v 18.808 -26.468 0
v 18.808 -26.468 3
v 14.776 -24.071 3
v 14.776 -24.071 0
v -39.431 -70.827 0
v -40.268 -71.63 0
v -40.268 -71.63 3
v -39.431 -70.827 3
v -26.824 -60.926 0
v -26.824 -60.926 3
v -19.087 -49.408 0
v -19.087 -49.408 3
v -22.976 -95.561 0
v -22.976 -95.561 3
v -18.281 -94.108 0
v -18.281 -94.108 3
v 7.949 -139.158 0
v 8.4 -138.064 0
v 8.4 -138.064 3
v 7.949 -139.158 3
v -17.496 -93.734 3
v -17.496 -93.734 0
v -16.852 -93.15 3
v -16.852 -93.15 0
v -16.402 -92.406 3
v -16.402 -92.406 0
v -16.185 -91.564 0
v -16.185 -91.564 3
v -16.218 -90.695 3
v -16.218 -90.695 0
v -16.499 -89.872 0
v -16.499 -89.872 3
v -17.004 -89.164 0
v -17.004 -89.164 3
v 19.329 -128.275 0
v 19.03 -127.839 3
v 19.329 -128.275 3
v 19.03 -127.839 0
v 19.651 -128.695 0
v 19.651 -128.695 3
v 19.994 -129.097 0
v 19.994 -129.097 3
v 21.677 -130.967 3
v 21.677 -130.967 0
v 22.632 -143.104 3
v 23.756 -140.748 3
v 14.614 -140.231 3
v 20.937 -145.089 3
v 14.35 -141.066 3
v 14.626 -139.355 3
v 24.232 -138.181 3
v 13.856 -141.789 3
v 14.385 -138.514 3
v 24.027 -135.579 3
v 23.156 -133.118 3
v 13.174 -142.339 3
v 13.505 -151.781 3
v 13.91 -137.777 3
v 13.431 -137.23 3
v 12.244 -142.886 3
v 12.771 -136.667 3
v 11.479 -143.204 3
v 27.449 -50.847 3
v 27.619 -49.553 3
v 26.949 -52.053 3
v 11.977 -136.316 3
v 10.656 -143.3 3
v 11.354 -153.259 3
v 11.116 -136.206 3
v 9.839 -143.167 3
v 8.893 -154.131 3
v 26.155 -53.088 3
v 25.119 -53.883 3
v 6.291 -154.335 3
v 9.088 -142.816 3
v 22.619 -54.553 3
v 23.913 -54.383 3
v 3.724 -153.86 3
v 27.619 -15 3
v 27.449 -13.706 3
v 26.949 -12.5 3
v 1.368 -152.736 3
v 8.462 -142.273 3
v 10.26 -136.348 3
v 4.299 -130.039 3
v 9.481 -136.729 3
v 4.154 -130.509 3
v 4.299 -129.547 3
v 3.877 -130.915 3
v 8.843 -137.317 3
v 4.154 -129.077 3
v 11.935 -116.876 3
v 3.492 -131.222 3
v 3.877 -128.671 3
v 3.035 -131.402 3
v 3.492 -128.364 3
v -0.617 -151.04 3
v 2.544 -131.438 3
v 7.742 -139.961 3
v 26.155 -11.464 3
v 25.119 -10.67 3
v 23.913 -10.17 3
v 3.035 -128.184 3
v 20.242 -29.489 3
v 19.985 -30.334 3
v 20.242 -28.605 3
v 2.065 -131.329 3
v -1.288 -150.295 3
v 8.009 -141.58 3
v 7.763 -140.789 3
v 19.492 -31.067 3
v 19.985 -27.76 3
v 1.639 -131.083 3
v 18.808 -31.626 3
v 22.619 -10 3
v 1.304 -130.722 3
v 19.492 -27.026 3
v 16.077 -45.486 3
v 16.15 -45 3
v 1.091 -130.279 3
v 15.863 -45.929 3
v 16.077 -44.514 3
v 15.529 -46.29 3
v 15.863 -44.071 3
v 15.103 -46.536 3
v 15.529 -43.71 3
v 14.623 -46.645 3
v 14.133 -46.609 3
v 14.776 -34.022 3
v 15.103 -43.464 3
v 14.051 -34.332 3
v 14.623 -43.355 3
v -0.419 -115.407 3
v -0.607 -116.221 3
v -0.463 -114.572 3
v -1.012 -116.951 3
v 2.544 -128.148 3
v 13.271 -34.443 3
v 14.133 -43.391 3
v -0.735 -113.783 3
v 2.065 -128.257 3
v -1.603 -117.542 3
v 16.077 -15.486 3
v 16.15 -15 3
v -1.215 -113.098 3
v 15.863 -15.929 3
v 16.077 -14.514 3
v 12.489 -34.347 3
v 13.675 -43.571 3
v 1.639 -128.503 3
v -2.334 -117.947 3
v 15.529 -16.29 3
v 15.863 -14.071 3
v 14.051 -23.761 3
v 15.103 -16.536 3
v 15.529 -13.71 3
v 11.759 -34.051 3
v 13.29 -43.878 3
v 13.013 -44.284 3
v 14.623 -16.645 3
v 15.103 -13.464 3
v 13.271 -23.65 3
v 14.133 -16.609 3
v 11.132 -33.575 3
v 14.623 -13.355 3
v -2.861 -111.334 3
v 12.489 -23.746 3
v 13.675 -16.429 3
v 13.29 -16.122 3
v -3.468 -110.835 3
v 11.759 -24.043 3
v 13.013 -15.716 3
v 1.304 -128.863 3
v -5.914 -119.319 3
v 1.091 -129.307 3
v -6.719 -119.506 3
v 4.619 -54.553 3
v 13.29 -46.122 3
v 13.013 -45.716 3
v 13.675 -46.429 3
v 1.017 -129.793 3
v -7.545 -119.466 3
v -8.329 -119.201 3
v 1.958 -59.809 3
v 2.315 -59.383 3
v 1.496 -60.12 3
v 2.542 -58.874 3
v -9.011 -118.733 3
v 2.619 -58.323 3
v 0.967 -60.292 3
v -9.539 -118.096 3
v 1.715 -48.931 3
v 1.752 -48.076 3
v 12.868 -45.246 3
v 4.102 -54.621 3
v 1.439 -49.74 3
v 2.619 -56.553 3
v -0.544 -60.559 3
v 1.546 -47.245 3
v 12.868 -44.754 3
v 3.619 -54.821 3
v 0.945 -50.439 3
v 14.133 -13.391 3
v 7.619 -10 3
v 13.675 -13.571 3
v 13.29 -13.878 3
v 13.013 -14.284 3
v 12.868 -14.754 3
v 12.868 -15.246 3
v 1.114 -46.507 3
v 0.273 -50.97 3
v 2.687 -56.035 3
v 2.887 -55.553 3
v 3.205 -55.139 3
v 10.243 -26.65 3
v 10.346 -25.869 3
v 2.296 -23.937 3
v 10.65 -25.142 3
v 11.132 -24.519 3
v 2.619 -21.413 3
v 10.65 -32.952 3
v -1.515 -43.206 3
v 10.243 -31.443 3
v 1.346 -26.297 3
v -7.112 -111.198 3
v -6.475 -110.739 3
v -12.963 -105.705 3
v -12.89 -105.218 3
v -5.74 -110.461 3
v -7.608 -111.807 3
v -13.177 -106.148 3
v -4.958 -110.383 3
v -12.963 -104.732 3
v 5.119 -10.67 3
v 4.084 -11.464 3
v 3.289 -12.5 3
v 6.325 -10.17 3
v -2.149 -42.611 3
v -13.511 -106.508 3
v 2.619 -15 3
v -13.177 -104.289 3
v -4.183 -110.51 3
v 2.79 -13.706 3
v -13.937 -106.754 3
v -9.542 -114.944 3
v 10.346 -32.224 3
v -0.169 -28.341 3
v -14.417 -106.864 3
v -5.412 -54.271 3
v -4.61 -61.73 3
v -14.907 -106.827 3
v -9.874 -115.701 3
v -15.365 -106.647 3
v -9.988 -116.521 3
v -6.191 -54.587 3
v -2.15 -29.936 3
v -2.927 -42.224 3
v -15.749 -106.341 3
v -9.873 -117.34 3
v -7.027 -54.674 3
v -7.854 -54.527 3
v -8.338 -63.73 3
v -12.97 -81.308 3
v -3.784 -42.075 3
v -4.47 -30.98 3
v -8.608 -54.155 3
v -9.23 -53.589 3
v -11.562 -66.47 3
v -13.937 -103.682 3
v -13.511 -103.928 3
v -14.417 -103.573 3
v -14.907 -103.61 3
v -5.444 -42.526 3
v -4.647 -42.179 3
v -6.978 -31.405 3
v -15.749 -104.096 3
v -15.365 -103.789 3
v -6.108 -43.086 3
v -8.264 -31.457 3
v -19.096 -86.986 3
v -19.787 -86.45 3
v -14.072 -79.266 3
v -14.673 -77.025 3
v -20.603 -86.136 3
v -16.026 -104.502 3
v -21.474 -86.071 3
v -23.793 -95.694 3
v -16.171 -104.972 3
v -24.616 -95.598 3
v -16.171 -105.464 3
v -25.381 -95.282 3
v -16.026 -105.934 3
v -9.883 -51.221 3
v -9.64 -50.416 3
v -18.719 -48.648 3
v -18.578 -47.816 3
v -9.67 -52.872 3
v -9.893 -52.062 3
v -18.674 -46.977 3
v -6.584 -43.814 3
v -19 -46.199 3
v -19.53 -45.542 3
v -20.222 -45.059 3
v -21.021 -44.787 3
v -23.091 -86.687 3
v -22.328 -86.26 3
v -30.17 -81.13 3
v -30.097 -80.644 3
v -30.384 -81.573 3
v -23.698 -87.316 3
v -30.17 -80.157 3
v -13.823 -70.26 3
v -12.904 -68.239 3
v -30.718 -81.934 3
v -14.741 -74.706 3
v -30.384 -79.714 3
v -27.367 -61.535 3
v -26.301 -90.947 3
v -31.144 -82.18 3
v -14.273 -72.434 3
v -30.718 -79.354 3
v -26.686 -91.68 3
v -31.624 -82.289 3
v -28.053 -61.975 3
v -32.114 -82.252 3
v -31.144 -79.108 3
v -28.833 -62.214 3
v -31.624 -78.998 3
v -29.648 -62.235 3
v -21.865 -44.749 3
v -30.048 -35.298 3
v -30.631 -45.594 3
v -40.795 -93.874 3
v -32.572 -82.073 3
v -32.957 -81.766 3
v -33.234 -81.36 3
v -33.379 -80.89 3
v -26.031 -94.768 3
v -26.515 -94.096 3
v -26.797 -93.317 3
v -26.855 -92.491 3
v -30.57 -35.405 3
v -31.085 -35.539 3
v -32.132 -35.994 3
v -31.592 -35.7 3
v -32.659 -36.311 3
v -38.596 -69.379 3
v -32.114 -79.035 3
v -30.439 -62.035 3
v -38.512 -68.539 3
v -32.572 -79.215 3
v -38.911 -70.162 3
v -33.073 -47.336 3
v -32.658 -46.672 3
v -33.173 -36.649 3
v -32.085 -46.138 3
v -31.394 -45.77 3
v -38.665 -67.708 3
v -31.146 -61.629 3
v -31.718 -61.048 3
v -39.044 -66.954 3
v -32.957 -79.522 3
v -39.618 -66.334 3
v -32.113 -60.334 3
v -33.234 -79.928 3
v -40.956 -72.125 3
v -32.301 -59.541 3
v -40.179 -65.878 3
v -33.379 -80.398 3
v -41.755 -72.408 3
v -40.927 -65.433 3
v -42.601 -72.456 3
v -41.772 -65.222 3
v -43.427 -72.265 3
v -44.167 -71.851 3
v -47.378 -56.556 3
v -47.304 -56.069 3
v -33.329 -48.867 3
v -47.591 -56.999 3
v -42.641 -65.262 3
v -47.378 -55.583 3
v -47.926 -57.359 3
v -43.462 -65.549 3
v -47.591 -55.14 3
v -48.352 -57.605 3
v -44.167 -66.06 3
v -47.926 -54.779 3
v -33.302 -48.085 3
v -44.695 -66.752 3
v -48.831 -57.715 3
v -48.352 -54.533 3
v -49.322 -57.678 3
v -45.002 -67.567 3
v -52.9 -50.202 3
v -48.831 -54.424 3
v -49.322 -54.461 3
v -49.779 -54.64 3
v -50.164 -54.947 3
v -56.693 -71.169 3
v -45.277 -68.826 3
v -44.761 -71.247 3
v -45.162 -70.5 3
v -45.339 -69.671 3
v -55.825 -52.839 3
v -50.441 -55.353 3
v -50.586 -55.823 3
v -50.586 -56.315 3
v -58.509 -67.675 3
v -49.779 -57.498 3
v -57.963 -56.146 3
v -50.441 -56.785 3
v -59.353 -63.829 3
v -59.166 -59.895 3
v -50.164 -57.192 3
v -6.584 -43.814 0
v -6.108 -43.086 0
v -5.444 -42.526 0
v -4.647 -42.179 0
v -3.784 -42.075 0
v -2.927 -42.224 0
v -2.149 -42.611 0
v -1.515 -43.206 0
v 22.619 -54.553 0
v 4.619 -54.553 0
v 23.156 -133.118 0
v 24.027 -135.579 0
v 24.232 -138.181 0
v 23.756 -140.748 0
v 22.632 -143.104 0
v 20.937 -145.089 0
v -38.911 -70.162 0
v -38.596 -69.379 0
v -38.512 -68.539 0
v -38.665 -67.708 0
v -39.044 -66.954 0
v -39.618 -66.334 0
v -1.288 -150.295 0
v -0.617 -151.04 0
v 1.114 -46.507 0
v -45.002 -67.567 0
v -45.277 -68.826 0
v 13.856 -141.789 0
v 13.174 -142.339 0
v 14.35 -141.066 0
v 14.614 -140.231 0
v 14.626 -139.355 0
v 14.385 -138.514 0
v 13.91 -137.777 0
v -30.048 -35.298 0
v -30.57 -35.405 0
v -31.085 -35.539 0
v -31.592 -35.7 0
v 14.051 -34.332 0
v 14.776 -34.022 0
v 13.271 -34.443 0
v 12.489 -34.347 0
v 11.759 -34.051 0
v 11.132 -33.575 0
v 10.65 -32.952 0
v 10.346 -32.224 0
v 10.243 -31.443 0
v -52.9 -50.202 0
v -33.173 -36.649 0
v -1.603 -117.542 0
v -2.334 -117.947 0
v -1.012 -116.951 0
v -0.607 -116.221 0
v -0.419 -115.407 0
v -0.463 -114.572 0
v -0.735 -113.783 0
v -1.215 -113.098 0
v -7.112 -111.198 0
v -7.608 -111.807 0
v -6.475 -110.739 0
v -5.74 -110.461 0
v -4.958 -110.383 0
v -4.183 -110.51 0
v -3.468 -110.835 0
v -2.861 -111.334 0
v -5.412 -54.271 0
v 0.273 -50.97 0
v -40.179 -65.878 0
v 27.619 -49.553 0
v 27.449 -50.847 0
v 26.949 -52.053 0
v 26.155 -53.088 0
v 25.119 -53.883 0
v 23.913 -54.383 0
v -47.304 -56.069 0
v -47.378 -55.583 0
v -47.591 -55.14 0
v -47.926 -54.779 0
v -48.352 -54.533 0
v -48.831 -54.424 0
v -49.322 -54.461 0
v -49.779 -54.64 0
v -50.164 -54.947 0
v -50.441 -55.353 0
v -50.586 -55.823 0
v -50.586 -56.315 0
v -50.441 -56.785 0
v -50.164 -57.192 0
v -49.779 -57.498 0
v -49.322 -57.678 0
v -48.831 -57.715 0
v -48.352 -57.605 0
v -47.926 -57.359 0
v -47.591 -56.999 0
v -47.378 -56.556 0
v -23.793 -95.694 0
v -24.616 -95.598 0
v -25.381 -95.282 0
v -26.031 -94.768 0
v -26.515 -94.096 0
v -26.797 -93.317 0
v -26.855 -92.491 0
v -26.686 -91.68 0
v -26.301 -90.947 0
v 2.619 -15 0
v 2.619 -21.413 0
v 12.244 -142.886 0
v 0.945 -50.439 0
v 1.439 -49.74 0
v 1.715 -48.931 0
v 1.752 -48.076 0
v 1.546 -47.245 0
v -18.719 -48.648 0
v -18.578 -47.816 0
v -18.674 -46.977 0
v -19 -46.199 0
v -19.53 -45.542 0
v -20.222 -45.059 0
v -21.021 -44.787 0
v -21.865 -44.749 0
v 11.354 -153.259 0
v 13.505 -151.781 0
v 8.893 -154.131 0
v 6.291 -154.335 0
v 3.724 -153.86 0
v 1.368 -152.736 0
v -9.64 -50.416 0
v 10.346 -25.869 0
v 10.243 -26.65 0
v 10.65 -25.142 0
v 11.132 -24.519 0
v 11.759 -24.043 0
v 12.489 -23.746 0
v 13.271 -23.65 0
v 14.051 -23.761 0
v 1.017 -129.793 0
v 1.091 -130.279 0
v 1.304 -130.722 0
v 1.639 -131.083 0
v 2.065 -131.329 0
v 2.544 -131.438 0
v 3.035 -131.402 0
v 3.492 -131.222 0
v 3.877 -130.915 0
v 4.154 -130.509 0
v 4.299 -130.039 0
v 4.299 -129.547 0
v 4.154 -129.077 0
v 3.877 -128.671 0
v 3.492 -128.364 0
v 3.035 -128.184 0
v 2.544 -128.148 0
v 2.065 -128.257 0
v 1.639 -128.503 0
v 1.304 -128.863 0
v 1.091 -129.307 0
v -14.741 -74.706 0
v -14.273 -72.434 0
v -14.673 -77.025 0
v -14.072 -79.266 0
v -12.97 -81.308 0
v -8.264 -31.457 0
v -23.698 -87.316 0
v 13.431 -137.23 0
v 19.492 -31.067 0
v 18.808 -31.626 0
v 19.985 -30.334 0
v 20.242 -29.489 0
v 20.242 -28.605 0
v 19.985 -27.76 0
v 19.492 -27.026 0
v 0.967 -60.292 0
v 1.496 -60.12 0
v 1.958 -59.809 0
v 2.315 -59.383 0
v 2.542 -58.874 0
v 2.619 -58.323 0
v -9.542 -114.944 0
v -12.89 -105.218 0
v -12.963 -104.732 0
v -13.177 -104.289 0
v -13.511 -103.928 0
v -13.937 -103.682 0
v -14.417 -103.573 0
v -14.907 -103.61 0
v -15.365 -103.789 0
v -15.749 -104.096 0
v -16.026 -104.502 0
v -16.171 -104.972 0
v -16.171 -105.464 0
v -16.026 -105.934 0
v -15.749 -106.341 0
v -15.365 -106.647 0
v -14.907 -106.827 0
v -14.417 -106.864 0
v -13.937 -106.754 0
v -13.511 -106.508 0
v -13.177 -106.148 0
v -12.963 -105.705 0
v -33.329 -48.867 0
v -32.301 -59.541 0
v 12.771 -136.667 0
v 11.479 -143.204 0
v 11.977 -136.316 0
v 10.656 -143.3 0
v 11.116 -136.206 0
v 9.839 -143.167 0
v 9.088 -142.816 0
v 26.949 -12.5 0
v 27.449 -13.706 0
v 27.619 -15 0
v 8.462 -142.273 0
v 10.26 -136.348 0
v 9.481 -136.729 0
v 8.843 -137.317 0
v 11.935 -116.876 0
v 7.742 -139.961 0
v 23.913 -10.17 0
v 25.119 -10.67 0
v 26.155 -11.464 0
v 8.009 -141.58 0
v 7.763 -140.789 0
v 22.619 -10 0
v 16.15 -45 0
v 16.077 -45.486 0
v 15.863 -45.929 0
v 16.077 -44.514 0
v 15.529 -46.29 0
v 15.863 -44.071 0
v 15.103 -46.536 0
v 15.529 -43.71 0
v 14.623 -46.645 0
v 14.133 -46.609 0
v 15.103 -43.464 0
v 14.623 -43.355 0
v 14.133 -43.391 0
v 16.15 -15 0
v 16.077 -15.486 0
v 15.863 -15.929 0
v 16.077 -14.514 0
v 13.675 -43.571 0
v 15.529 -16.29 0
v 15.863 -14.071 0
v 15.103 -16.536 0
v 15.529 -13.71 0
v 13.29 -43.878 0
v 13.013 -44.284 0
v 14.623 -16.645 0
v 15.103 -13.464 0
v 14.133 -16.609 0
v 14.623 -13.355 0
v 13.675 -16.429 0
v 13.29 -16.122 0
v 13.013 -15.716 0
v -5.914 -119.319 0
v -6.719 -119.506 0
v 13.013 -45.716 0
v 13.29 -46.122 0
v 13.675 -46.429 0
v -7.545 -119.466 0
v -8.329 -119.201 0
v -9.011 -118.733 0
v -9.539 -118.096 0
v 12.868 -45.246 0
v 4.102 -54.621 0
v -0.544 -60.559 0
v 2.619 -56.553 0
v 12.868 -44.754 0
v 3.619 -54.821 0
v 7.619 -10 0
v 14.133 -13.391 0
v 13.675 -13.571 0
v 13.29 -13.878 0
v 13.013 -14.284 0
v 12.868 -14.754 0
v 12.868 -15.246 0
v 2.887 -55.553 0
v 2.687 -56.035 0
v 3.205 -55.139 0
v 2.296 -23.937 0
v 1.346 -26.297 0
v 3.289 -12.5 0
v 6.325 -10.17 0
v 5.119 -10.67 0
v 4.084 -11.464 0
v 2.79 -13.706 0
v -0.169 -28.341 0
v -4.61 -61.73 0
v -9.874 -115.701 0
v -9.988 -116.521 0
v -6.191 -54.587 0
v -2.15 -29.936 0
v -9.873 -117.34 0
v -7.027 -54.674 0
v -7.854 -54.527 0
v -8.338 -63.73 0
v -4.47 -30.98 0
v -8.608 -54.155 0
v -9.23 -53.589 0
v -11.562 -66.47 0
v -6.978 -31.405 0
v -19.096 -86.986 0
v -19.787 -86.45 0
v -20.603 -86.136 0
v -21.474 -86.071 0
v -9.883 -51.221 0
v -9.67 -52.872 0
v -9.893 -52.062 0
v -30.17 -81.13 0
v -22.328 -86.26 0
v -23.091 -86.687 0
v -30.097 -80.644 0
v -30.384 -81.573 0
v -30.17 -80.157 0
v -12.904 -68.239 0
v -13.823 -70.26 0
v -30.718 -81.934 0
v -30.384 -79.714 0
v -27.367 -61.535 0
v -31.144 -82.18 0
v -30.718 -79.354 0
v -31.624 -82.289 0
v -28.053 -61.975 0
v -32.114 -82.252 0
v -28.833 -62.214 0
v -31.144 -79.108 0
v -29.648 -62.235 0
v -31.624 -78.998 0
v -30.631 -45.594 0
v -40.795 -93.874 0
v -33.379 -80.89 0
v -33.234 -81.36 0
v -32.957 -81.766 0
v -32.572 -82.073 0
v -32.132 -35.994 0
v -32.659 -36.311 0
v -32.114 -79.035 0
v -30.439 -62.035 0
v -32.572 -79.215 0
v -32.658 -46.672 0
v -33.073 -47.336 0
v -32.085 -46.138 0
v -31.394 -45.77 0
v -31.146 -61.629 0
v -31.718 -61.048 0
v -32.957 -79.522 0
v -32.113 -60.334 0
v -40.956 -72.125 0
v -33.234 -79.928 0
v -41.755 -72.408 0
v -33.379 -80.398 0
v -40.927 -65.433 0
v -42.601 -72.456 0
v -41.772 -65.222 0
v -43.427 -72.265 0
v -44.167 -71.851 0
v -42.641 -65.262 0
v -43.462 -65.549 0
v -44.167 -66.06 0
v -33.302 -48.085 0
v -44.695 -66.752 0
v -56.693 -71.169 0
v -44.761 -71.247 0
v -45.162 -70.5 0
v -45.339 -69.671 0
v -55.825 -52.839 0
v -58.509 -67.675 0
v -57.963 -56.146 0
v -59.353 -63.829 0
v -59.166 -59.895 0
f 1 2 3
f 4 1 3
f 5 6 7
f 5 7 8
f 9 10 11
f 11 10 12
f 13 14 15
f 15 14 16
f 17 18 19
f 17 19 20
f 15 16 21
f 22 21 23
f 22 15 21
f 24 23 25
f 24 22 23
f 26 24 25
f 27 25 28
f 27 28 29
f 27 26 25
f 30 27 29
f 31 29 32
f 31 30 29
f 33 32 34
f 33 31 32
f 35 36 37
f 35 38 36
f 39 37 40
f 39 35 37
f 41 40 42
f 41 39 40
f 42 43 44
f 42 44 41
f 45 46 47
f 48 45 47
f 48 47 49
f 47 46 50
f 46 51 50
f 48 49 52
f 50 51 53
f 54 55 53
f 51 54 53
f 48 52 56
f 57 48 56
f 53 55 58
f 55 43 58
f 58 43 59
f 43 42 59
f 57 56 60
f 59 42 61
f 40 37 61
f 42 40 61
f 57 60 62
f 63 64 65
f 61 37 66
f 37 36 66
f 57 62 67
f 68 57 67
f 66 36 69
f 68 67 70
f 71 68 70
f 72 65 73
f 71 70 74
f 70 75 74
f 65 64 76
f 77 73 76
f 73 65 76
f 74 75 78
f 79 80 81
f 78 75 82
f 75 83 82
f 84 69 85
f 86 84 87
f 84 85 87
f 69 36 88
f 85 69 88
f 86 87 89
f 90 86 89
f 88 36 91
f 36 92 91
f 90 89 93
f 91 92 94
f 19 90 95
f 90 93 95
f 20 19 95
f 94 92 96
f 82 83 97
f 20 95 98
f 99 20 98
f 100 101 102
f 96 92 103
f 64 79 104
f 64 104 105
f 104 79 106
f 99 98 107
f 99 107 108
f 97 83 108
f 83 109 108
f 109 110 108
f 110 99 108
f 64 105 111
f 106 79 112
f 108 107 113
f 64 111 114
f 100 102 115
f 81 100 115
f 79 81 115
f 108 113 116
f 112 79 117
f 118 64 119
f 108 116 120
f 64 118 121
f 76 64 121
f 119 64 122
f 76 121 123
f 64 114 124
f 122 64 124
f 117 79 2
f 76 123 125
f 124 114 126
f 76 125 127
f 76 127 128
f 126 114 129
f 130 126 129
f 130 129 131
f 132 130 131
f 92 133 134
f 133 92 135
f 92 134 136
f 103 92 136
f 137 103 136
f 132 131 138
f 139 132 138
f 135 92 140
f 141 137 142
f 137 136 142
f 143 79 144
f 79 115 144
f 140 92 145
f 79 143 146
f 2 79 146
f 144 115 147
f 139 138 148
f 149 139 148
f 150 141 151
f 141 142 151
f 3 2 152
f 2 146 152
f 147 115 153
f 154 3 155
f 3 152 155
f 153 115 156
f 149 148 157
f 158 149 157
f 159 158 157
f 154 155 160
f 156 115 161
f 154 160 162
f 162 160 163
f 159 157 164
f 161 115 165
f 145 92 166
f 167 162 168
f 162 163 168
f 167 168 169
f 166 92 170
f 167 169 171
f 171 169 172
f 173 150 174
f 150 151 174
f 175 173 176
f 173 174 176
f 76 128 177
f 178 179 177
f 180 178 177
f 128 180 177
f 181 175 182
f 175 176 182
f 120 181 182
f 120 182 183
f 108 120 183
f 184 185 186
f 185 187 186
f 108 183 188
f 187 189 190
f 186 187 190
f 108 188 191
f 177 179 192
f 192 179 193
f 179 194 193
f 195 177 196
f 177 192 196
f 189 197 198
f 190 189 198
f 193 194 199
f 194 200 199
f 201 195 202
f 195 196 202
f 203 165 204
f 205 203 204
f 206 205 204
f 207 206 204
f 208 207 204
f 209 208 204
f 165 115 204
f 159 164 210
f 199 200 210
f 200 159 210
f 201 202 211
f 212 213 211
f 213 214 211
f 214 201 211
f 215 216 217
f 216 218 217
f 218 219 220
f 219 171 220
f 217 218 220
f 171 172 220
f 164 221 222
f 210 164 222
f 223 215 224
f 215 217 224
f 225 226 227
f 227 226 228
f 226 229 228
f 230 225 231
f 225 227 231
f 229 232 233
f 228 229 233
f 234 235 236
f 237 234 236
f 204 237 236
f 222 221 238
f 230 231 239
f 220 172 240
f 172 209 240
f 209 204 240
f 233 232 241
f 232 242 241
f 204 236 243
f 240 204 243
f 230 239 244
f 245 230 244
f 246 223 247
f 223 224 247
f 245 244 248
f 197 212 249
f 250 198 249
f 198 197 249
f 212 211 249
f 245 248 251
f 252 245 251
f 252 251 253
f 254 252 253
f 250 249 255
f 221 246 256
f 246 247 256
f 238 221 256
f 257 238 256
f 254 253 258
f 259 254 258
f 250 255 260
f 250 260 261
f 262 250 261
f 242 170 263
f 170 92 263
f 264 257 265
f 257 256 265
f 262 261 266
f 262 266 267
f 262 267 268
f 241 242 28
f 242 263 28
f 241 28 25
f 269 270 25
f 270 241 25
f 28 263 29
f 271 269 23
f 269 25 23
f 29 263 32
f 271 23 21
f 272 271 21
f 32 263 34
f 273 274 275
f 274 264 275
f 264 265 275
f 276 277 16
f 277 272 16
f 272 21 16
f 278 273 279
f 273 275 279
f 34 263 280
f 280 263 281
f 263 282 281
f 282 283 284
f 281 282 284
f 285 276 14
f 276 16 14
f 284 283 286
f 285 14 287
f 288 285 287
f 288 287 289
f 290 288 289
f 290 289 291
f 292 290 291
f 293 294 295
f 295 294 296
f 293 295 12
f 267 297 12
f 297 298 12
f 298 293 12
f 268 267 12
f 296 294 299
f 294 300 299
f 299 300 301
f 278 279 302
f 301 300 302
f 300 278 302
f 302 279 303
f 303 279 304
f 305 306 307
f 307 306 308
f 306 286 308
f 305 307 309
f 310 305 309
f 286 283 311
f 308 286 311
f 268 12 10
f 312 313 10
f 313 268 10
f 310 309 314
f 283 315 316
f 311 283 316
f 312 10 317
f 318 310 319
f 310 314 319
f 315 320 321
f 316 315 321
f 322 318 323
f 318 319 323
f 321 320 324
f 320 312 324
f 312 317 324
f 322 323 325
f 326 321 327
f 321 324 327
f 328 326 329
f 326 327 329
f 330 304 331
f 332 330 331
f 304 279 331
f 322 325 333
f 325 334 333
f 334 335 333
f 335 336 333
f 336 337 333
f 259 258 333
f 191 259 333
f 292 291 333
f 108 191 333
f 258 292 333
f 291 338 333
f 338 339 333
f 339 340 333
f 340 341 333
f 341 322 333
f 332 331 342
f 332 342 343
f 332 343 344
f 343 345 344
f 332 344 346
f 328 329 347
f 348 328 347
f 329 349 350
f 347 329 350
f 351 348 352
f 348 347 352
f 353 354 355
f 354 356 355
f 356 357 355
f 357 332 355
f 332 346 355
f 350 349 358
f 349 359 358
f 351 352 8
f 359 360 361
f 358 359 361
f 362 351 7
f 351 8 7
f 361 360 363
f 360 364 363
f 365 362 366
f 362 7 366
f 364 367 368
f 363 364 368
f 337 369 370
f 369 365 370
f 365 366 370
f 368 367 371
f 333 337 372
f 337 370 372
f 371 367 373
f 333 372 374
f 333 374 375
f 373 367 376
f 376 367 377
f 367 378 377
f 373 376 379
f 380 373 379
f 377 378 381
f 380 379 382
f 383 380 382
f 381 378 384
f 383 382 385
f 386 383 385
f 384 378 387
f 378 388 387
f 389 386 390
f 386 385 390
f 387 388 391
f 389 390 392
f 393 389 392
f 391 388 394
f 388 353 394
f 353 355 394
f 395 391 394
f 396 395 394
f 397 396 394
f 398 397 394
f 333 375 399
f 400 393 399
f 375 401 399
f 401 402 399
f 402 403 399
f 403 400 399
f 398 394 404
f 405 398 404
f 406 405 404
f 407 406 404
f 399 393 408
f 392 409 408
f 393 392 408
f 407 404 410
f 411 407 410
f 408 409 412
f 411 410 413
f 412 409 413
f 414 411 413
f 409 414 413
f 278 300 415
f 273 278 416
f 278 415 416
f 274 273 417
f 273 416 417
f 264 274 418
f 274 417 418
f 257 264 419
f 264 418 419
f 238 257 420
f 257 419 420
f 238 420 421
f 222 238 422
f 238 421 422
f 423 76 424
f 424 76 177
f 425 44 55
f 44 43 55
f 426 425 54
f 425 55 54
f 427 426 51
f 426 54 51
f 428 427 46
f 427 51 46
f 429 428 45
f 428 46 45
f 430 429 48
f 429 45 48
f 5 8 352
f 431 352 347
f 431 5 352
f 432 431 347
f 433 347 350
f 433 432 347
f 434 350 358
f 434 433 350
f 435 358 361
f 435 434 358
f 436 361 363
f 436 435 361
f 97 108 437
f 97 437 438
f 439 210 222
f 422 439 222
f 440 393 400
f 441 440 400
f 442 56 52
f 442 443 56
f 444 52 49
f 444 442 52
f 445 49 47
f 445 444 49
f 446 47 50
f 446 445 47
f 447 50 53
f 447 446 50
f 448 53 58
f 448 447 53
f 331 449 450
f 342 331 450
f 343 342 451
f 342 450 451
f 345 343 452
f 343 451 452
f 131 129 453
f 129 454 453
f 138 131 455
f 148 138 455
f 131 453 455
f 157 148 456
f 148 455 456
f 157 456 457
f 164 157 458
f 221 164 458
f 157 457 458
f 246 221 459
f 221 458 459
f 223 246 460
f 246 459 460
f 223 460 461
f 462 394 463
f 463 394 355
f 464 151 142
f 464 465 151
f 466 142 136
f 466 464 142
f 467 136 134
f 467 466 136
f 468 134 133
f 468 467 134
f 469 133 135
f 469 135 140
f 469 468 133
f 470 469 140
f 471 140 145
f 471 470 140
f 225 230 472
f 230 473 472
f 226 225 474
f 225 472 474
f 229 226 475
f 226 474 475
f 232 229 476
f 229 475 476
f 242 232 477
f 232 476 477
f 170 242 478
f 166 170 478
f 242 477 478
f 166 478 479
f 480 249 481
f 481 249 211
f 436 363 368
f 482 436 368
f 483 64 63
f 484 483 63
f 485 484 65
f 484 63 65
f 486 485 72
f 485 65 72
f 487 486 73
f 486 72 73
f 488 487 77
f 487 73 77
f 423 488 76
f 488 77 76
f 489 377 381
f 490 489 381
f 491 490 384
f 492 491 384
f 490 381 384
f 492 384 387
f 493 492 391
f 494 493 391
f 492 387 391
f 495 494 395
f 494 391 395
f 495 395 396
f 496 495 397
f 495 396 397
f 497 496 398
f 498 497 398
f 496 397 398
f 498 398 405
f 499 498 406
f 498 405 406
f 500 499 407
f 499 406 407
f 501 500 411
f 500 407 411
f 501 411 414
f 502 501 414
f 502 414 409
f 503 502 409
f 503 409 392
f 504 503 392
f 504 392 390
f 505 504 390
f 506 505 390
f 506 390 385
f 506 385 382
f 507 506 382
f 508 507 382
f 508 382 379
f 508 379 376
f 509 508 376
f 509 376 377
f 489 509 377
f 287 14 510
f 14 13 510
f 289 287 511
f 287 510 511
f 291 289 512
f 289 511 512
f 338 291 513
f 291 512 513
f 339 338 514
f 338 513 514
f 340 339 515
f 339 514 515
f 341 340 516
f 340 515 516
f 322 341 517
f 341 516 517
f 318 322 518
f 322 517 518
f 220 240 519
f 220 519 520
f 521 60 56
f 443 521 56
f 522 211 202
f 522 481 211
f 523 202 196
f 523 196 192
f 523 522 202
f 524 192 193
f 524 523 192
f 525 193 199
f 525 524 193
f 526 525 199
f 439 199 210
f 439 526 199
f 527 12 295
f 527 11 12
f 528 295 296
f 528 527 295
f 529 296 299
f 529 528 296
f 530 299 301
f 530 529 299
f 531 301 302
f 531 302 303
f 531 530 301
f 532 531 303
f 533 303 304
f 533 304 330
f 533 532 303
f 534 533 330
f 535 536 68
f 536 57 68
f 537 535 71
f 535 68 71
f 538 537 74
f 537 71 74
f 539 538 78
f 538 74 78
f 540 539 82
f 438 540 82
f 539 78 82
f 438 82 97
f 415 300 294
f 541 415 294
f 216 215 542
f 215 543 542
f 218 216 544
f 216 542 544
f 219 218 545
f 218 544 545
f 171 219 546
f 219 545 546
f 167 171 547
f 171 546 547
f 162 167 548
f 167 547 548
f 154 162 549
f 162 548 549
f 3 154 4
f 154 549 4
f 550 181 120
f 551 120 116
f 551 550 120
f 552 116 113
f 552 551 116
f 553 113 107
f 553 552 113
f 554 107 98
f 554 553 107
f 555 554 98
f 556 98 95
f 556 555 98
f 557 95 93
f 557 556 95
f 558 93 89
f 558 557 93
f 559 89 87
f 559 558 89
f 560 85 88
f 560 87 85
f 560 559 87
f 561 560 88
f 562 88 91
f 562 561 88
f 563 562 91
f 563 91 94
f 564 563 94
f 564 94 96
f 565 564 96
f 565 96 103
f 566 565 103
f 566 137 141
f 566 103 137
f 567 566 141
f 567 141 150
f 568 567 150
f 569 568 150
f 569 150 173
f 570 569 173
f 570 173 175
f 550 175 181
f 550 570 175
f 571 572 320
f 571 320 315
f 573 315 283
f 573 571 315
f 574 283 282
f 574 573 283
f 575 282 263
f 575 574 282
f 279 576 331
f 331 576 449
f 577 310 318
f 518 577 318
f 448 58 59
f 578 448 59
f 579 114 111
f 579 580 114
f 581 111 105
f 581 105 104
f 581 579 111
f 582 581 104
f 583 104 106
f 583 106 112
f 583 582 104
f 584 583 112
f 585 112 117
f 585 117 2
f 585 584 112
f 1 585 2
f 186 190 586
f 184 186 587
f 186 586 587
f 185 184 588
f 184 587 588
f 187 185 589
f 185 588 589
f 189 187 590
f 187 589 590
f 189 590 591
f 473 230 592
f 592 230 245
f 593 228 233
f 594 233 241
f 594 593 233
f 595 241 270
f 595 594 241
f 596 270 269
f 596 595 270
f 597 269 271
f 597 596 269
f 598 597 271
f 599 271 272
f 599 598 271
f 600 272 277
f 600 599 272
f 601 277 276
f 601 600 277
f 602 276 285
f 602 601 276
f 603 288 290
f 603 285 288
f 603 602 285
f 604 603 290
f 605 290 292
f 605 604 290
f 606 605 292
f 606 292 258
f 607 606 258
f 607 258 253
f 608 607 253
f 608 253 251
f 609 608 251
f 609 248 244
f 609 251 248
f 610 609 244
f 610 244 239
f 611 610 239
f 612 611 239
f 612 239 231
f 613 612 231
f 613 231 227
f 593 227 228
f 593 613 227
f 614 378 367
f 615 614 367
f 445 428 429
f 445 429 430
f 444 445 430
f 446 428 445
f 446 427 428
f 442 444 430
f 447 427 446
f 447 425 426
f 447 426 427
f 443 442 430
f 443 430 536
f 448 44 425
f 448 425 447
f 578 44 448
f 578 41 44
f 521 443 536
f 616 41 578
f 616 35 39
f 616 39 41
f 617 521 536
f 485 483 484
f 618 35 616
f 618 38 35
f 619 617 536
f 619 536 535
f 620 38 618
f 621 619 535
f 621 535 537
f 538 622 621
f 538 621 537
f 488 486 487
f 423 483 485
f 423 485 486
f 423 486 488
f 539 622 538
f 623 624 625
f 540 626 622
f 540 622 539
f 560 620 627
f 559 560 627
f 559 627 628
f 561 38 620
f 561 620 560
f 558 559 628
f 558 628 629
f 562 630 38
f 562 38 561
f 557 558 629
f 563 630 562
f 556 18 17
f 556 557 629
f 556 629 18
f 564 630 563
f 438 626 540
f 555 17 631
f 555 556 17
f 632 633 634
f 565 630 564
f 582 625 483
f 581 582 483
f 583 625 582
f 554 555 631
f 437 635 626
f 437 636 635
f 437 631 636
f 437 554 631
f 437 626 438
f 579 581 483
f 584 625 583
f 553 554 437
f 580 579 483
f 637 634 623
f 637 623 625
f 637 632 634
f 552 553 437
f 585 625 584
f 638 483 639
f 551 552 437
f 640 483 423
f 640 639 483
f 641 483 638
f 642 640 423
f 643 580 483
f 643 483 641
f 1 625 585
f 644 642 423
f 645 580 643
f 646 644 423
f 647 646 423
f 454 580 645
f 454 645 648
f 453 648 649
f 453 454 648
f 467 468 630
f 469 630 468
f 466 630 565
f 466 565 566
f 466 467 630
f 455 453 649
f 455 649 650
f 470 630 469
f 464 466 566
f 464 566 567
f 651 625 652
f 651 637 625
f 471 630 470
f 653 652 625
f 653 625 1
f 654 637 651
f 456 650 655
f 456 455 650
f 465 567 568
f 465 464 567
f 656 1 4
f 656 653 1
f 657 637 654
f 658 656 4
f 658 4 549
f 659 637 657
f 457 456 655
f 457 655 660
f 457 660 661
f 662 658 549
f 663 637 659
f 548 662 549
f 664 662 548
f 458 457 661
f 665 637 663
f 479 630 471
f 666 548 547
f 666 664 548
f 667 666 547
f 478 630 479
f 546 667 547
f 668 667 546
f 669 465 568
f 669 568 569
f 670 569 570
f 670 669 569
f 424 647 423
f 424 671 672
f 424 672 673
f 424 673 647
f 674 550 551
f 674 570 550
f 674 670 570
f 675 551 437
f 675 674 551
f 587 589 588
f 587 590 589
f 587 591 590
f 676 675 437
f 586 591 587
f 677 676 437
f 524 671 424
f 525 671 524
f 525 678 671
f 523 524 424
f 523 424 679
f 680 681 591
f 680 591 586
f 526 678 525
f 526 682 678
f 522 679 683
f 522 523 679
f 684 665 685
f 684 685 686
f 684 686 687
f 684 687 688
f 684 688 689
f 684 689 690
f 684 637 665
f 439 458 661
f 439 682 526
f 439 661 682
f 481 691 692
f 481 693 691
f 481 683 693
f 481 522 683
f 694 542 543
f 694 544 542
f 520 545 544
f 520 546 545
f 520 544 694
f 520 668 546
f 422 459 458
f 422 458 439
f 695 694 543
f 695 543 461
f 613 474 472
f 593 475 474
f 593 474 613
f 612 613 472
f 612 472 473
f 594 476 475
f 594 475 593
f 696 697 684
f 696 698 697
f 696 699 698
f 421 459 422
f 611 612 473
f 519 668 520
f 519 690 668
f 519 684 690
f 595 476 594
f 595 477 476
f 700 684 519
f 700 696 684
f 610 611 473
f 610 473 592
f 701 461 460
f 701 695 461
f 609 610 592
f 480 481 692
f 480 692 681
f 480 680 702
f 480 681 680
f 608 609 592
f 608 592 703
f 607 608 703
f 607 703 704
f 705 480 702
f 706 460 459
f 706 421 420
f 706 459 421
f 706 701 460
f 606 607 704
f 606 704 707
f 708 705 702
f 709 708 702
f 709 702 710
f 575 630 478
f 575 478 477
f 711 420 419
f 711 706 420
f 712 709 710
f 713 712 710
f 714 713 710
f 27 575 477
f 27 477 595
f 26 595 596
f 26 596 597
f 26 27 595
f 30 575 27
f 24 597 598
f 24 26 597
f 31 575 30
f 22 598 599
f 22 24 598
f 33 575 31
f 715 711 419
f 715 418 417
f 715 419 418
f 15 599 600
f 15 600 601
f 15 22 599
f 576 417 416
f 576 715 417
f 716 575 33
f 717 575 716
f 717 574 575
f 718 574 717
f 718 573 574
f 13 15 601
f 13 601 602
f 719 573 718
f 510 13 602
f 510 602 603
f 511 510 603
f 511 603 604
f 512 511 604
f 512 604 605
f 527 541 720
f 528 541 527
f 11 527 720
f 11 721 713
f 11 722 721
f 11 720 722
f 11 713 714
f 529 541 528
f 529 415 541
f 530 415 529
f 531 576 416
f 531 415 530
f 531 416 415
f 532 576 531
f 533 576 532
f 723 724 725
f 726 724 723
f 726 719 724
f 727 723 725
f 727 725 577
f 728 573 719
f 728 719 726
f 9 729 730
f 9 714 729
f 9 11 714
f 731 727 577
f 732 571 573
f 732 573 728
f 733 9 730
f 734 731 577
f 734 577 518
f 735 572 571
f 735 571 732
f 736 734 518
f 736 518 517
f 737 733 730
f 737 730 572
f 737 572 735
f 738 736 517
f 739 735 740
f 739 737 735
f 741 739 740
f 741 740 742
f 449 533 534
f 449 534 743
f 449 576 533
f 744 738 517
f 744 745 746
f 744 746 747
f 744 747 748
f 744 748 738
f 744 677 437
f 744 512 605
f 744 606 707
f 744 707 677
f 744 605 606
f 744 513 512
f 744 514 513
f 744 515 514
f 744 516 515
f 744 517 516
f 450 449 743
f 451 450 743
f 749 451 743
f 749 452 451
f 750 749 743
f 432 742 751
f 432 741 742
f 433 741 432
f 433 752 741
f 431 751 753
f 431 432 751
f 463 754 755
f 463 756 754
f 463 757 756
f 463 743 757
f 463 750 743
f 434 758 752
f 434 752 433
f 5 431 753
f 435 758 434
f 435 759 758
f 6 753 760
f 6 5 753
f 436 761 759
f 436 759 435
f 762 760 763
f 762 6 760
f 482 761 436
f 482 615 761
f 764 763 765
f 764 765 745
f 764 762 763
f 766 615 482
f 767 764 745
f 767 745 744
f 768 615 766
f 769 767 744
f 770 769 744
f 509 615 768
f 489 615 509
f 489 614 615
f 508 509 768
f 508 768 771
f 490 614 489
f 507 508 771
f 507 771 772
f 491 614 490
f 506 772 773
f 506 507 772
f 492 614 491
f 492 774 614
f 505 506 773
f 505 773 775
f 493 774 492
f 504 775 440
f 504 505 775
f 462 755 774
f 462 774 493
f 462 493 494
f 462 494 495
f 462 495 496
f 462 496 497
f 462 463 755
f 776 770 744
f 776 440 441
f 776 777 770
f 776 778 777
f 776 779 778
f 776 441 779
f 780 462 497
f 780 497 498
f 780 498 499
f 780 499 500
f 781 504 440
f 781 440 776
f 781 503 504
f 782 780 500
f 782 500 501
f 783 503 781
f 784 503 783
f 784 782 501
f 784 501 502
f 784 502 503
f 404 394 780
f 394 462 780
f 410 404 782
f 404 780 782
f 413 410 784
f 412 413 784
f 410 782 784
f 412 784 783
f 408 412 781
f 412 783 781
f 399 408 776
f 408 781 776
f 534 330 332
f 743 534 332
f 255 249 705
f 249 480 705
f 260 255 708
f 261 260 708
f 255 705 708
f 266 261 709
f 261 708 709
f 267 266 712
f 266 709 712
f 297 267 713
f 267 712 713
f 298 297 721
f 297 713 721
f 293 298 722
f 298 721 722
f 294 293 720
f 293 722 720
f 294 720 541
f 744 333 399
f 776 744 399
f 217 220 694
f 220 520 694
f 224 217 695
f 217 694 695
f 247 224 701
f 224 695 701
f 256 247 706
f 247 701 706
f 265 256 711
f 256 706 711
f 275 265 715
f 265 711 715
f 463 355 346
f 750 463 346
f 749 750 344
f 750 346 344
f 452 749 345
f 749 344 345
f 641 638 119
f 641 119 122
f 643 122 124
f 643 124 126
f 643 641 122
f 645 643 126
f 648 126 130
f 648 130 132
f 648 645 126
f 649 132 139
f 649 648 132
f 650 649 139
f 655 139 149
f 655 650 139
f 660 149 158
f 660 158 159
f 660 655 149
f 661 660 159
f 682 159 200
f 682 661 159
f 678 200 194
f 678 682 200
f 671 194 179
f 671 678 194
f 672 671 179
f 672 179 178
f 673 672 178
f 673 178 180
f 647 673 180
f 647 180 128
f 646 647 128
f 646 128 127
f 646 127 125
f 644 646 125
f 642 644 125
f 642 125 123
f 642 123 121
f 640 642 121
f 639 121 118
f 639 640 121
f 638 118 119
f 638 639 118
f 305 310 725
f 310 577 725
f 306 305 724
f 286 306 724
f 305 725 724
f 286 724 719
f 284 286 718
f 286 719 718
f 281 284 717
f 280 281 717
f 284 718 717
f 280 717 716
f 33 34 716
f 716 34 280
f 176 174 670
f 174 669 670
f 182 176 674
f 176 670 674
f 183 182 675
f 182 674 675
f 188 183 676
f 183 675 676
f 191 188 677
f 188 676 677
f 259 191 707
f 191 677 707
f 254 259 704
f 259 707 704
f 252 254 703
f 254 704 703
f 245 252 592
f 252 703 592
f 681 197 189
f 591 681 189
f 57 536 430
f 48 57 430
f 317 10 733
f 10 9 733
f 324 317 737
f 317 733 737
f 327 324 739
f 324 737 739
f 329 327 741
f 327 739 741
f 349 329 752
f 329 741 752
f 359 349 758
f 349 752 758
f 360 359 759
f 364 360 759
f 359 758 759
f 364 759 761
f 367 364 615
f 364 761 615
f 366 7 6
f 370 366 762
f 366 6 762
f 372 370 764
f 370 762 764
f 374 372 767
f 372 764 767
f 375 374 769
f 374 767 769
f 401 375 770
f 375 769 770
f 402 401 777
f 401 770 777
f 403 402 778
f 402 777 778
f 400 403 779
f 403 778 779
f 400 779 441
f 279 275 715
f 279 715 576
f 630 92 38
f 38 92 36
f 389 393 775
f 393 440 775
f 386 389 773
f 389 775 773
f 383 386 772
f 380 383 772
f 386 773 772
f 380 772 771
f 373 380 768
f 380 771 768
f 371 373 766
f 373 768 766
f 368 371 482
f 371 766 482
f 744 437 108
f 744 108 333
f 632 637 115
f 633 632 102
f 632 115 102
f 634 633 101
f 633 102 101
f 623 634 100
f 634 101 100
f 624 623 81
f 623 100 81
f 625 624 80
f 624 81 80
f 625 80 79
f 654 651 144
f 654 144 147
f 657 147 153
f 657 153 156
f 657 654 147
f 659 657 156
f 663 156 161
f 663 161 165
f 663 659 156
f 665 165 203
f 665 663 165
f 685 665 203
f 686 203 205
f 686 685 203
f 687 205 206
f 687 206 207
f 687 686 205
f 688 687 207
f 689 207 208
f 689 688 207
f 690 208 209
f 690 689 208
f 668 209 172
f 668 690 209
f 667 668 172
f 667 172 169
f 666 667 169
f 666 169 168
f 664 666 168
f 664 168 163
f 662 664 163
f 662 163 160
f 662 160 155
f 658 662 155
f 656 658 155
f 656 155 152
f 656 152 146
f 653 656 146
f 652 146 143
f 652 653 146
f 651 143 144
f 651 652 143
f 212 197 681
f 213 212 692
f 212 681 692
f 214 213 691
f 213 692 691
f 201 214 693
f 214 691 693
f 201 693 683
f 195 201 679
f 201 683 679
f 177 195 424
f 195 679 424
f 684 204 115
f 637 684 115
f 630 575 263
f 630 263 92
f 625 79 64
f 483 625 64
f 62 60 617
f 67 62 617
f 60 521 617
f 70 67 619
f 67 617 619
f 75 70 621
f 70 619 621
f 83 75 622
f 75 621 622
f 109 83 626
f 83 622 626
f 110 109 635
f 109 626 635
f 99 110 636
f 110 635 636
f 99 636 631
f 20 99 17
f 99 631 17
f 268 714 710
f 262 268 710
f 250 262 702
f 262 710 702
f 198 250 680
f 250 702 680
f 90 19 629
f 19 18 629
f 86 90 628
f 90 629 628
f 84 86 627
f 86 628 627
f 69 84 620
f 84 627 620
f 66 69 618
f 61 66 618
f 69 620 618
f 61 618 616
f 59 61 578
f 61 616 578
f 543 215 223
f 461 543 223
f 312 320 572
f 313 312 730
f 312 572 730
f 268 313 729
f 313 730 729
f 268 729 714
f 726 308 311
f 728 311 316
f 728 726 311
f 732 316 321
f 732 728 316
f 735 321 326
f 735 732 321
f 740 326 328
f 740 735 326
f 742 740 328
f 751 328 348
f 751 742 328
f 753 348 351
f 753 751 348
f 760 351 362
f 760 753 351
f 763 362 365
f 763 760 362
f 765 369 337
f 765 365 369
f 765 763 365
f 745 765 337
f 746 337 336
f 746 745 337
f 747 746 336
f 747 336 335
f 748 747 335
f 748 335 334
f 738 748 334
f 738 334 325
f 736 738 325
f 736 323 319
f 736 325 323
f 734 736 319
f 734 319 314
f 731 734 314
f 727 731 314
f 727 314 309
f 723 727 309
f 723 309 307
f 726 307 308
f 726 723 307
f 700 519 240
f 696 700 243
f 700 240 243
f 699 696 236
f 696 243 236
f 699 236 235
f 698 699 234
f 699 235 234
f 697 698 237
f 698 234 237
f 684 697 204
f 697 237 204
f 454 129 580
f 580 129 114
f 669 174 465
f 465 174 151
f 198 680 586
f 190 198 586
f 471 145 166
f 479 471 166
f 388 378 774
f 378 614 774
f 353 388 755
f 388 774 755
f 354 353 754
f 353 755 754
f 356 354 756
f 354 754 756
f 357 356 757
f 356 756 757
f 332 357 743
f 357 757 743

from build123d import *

# Parameters (mm, degrees)
SKETCH_1_R          = 1.65
EXTRUDE_1_DEPTH     = 3
CUT_EXTRUDE_1_DEPTH = 3
FILLET_1_R          = 10
EXTRUDE_2_DEPTH     = 3
FILLET_2_R          = 10
SKETCH_6_R          = 1.65
CUT_EXTRUDE_2_DEPTH = 33
FILLET_3_R          = 10
FILLET_4_R          = 10
EXTRUDE_3_DEPTH     = 3
SKETCH_8_R          = 1.65
CUT_EXTRUDE_3_DEPTH = 4
CUT_EXTRUDE_5_DEPTH = 4
FILLET_6_R          = 15
FILLET_7_R          = 15
CUT_EXTRUDE_6_DEPTH = 4
FILLET_8_R          = 3
CUT_EXTRUDE_7_DEPTH = 4
FILLET_11_R         = 2
FILLET_12_R         = 10
CUT_EXTRUDE_8_DEPTH = 4
FILLET_13_R         = 10


with BuildPart() as part:
    # 草图1 → 凸台-拉伸1 (new body)
    with BuildSketch(Plane.XY):
        with BuildLine():
            Line((0, -30), (-76.636599455, -43.513100194))
            Line((-76.636599455, -43.513100194), (-94.295597777, -47.000187555))
            Line((-94.295597777, -47.000187555), (6.073993177, -158.471911377))
            Line((6.073993177, -158.471911377), (28.368337941, -138.397993186))
            Line((28.368337941, -138.397993186), (-11.934165547, -93.637528433))
            ThreePointArc((-11.934165547, -93.637528433), (-15.981640549, -73.743553217), (-0.54423259, -60.558761246))
            Line((-0.54423259, -60.558761246), (29, -55.349315916))
            Line((29, -55.349315916), (29, -50))
            Line((29, -50), (29, 0))
            Line((29, 0), (0, 0))
            Line((0, 0), (0, -30))
        make_face()
        with Locations((14.5, -15)):
            Circle(SKETCH_1_R, mode=Mode.SUBTRACT)
        with Locations((14.5, -45)):
            Circle(SKETCH_1_R, mode=Mode.SUBTRACT)
    extrude(amount=EXTRUDE_1_DEPTH)

    # 草图2 → 切除-拉伸1 (cut)
    with BuildSketch(Plane.XY.offset(3)):
        Polygon((-37.509702142, -36.613972526), (-44.1108023, -102.736049466), (-92.232515274, -102.736049466), (-120.974922517, -15.648301308), align=None)
    extrude(amount=-CUT_EXTRUDE_1_DEPTH, mode=Mode.SUBTRACT)

    # 圆角1
    fillet_1_edges = [part.edges().sort_by_distance(p)[0] for p in [
        (0, 0, 1.5),
        (29, 0, 1.5),
        (29, -55.349315916, 1.5),
        (28.368337941, -138.397993186, 1.5),
        (6.073993177, -158.471911377, 1.5),
        (0, -30, 1.5),
        (-37.509702142, -36.613972526, 1.5),
        (-44.1108023, -102.736049466, 1.5),
    ]]
    fillet(fillet_1_edges, radius=FILLET_1_R)

    # 草图3 → 凸台-拉伸2 (add)
    with BuildSketch(Plane.XY.offset(3)):
        Polygon((-15.981640549, -73.743553217), (19.461958696, -128.506456934), (-25.512326967, -91.299735006), align=None)
    extrude(amount=-EXTRUDE_2_DEPTH)

    # 圆角2
    fillet_2_edges = [part.edges().sort_by_distance(p)[0] for p in [
        (-15.981640549, -73.743553217, 1.5),
        (19.461958696, -128.506456934, 1.5),
    ]]
    fillet(fillet_2_edges, radius=FILLET_2_R)

    # 草图6 → 切除-拉伸2 (cut)
    with BuildSketch(Plane.XY):
        Polygon((-87.672076615, -95.352784266), (10.45531874, -167.066930238), (-55.522232913, -72.841221354), align=None)
        Polygon((-17.568683959, -74.741102773), (35.029880069, -149.859637147), (-14.273329758, -72.43367092), align=None)
        with Locations((-31.747162049, -80.643839485)):
            Circle(SKETCH_6_R)
        with Locations((-14.539868958, -105.218400814)):
            Circle(SKETCH_6_R)
        with Locations(Location((2.667424132, -129.792962143, 0), (0, 0, 180))):
            Circle(SKETCH_6_R)
    extrude(amount=CUT_EXTRUDE_2_DEPTH, mode=Mode.SUBTRACT)

    # 圆角3
    # the kernel refuses this fillet: 10 mm, written as the material it adds along each edge
    with BuildSketch(Plane(origin=(-17.568683959, -74.741102773, 0), x_dir=(0.8191520442890025, 0.5735764363510307, 0), z_dir=(0, 0, 1))) as fillet_3_piece_1:
        with BuildLine():
            CenterArc((10, -8.017112469), FILLET_3_R, 126.706173487, 53.293826513)
            Line((0, -8.017112469), (-0.2, -8.017112469))
            Line((-0.2, -8.017112469), (-0.2, 0))
            Line((-0.2, 0), (0, 0.2))
            ThreePointArc((0, 0.2), (2.011442335, 0.2), (3.903342364, 0.160342249))
            Line((3.903342364, 0.160342249), (4.02288467, 0))
        make_face()
    extrude(amount=3)

    # 圆角4
    fillet_4_edges = [part.edges().sort_by_distance(p)[0] for p in [
        (-42.922716134, -90.835196128, 1.5),
    ]]
    fillet(fillet_4_edges, radius=FILLET_4_R)

    # 草图7 → 凸台-拉伸3 (add)
    with BuildSketch(Plane.XY.offset(3)):
        Polygon((-34.566125117, -102.769644932), (-65.373370144, -58.772339354), (-42.090796033, -16.519494834), (-31.58573936, -35.55781759), align=None)
    extrude(amount=-EXTRUDE_3_DEPTH)

    # 草图8 → 切除-拉伸3 (cut)
    with BuildSketch(Plane.XY.offset(3)):
        with Locations((-48.954455139, -56.069278157)):
            Circle(SKETCH_8_R)
    extrude(amount=-CUT_EXTRUDE_3_DEPTH, mode=Mode.SUBTRACT)

    # 草图9 → 切除-拉伸5 (cut)
    with BuildSketch(Plane.XY.offset(3)):
        Polygon((-31.58573936, -35.55781759), (-42.090796033, -16.519494834), (-65.373370144, -58.772339354), align=None)
    extrude(amount=-CUT_EXTRUDE_5_DEPTH, mode=Mode.SUBTRACT)

    # 圆角6
    fillet_6_edges = [part.edges().sort_by_distance(p)[0] for p in [
        (-65.373370144, -58.772339354, 1.5),
    ]]
    fillet(fillet_6_edges, radius=FILLET_6_R)

    # 圆角7
    # the kernel refuses this fillet: 15 mm, written as the material it takes off along each edge
    with BuildSketch(Plane(origin=(-31.58573936, -35.55781759, 7.815831315), x_dir=(-0.8242067246408917, -0.5662890384394996, 0), z_dir=(0, 0, -1))) as fillet_7_piece_1:
        with BuildLine():
            CenterArc((1.926332526, -15), FILLET_7_R, 90, 7.049103332)
            Line((0.085533646, -0.11337985), (0, 0))
            Line((0, 0), (1.926332526, 0))
        make_face()
    extrude(amount=12.63166263, mode=Mode.SUBTRACT)

    # 草图10 → 切除-拉伸6 (cut)
    with BuildSketch(Plane.XY.offset(3)):
        Polygon((-31.497161439, -67.881768792), (-15.547904948, -44.140451067), (-33.616807091, -45.881308748), align=None)
        Polygon((-13.635910341, -59.04618523), (3.278405873, -49.224969364), (-4.542191946, -39.403753498), align=None)
        Polygon((10.242872605, -36.716551154), (23.145942056, -29.046782931), (10.242872605, -21.377014708), align=None)
        Polygon((-47.382252639, -78.462252302), (-36.982602957, -68.475134443), (-43.961583104, -62.806110969), align=None)
        Polygon((-31.497161439, -98.196884234), (-13.635910341, -92.671187293), (-21.595666913, -84.382641882), align=None)
        Polygon((-14.194825195, -122.494735697), (1.82276298, -116.352745612), (-5.544832941, -108.458892839), align=None)
        Polygon((4.547829517, -147.416387444), (16.294826397, -140.502022472), (10.242872605, -133.5876575), align=None)
    extrude(amount=-CUT_EXTRUDE_6_DEPTH, mode=Mode.SUBTRACT)

    # 圆角8
    fillet_8_edges = [part.edges().sort_by_distance(p)[0] for p in [
        (16.294826397, -140.502022472, 1.5),
        (4.547829517, -147.416387444, 1.5),
        (10.242872605, -133.5876575, 1.5),
        (1.82276298, -116.352745612, 1.5),
        (-14.194825195, -122.494735697, 1.5),
        (-5.544832941, -108.458892839, 1.5),
        (-13.635910341, -92.671187293, 1.5),
        (-31.497161439, -98.196884234, 1.5),
        (-21.595666913, -84.382641882, 1.5),
        (-36.982602957, -68.475134443, 1.5),
        (-47.382252639, -78.462252302, 1.5),
        (-43.961583104, -62.806110969, 1.5),
        (23.145942056, -29.046782931, 1.5),
        (10.242872605, -36.716551154, 1.5),
        (10.242872605, -21.377014708, 1.5),
        (3.278405873, -49.224969364, 1.5),
        (-13.635910341, -59.04618523, 1.5),
        (-4.542191946, -39.403753498, 1.5),
        (-15.547904948, -44.140451067, 1.5),
        (-31.497161439, -67.881768792, 1.5),
        (-33.616807091, -45.881308748, 1.5),
    ]]
    fillet(fillet_8_edges, radius=FILLET_8_R)

    # 草图13 → 切除-拉伸7 (cut)
    with BuildSketch(Plane.XY.offset(3)):
        with BuildLine():
            ThreePointArc((2.619259417, -15), (4.083725511, -11.464466094), (7.619259417, -10))
            Line((7.619259417, -10), (22.619259417, -10))
            ThreePointArc((22.619259417, -10), (26.154793323, -11.464466094), (27.619259417, -15))
            Line((27.619259417, -15), (27.619259417, -49.552905051))
            ThreePointArc((27.619259417, -49.552905051), (26.154793323, -53.088438957), (22.619259417, -54.552905051))
            Line((22.619259417, -54.552905051), (2.619259417, -54.552905051))
            Line((2.619259417, -54.552905051), (2.619259417, -60.000952252))
            Line((2.619259417, -60.000952252), (20.736481777, -56.806397134))
            ThreePointArc((20.736481777, -56.806397134), (26.660444431, -53.386195701), (29, -46.958319604))
            Line((29, -46.958319604), (29, -10))
            ThreePointArc((29, -10), (26.071067812, -2.928932188), (19, 0))
            Line((19, 0), (10, 0))
            ThreePointArc((10, 0), (2.928932188, -2.928932188), (0, -10))
            Line((0, -10), (0, -15))
            Line((0, -15), (2.619259417, -15))
        make_face()
    extrude(amount=-CUT_EXTRUDE_7_DEPTH, mode=Mode.SUBTRACT)

    # 圆角11
    fillet_11_edges = [part.edges().sort_by_distance(p)[0] for p in [
        (2.619259417, -60.000952252, 1.5),
        (2.619259417, -54.552905051, 1.5),
    ]]
    fillet(fillet_11_edges, radius=FILLET_11_R)

    # 圆角12
    # the kernel refuses this fillet: 10 mm, written as the material it takes off along each edge
    with BuildSketch(Plane(origin=(0, -15, 19.695908746), x_dir=(1, 0, 0), z_dir=(0, 0, -1))) as fillet_12_piece_1:
        with BuildLine():
            CenterArc((9.999518916, 6.7477233), FILLET_12_R, 180.397405601, 42.039067217)
            Line((-0.000240542, 6.678363494), (-1.000216488, 6.671427514))
            ThreePointArc((-1.000216488, 6.671427514), (-1, 6.609003688), (-1, 0))
            Line((-1, 0), (0, -1))
            ThreePointArc((0, -1), (1.309629709, -1), (1.881233468, -0.67477233))
            Line((1.881233468, -0.67477233), (2.619259417, 0))
        make_face()
    extrude(amount=36.391817492, mode=Mode.SUBTRACT)

    # 草图14 → 切除-拉伸8 (cut)
    with BuildSketch(Plane.XY.offset(3)):
        Polygon((2.619259417, -15), (2.619259417, -31.018717886), (-8.263518223, -31.457081218), (-8.263518223, -7.080960467), align=None)
    extrude(amount=-CUT_EXTRUDE_8_DEPTH, mode=Mode.SUBTRACT)

    # 圆角13
    fillet_13_edges = [part.edges().sort_by_distance(p)[0] for p in [
        (2.619259417, -31.018717886, 1.5),
    ]]
    fillet(fillet_13_edges, radius=FILLET_13_R)


solid = part.part
